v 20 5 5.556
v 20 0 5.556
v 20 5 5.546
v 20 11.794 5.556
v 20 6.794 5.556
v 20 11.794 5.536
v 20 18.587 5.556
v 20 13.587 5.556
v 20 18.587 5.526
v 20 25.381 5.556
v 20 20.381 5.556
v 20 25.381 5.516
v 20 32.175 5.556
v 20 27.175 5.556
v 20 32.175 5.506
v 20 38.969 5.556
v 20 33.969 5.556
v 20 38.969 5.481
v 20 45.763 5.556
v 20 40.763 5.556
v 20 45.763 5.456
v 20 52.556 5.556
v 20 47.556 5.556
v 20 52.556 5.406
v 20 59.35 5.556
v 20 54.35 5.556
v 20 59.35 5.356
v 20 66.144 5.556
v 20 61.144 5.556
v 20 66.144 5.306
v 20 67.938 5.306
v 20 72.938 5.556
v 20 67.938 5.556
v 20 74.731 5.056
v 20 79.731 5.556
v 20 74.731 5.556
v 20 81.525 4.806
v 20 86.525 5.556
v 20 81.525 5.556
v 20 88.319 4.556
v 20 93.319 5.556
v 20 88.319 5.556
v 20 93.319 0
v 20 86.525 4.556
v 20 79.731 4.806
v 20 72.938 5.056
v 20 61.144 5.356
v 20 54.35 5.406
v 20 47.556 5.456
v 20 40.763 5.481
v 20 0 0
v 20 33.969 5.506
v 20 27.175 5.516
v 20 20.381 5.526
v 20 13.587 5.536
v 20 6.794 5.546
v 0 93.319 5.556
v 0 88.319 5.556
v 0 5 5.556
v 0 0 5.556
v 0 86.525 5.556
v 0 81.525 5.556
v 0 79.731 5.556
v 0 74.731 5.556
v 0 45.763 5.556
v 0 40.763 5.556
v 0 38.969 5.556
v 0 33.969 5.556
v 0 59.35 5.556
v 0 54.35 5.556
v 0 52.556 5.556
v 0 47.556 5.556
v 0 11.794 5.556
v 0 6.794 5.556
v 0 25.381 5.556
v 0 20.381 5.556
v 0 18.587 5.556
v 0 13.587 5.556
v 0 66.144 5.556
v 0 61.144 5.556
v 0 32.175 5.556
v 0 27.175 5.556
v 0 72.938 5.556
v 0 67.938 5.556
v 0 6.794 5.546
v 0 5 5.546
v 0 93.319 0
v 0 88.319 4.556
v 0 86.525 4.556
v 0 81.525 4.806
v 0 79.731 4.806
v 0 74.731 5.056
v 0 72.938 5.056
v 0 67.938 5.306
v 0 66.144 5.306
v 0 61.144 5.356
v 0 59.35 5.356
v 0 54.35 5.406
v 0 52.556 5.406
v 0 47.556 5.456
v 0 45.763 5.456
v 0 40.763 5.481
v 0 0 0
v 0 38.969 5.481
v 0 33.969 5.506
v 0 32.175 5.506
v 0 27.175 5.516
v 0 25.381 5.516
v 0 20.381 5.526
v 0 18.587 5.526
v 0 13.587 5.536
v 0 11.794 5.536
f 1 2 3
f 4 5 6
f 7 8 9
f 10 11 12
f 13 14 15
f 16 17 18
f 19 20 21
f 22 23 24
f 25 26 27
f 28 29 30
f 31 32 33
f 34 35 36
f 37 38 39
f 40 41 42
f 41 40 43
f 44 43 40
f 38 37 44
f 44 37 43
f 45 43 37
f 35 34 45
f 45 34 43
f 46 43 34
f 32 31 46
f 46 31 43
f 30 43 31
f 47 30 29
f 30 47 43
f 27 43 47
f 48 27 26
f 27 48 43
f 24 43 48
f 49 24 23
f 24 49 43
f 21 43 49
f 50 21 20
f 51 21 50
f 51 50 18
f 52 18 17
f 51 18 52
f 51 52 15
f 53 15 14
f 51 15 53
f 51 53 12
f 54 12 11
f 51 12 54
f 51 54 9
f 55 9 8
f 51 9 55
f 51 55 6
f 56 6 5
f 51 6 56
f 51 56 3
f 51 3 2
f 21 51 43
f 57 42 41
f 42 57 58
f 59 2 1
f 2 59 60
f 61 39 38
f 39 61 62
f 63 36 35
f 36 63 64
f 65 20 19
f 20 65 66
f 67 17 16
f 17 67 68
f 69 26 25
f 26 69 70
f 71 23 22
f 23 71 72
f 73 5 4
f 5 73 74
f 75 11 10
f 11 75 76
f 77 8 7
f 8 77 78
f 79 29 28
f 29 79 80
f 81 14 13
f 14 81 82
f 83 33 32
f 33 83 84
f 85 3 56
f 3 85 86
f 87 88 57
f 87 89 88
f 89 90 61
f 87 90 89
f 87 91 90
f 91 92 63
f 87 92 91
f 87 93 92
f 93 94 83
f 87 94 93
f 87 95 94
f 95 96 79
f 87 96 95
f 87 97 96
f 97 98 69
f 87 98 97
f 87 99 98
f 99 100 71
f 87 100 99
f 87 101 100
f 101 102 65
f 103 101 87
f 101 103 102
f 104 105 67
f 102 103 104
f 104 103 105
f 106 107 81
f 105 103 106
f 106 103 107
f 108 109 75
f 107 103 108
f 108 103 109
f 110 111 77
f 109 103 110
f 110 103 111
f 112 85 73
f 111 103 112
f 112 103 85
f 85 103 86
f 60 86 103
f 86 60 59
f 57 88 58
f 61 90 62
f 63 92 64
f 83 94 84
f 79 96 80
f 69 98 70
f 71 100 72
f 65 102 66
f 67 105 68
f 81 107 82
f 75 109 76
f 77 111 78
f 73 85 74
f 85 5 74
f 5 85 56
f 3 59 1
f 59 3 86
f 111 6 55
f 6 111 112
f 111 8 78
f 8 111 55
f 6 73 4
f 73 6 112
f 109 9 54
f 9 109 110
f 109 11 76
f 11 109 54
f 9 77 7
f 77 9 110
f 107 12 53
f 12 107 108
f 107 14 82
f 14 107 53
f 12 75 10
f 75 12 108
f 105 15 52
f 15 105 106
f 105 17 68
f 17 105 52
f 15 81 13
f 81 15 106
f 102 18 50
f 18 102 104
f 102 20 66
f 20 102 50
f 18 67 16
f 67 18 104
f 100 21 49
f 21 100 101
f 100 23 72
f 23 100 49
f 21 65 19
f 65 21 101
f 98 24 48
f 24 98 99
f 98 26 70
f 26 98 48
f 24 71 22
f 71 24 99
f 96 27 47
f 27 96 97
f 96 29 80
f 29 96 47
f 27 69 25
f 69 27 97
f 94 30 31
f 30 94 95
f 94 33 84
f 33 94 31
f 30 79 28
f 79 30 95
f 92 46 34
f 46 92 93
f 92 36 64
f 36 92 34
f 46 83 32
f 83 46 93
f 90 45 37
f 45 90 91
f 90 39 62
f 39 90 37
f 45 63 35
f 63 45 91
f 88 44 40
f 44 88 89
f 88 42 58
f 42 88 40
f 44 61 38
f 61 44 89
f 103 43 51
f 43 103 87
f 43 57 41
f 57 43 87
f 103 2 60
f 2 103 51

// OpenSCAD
//Parameters
  //Cube sizes to test
  zDepth = [0.01, 0.02, 0.03, 0.04, 0.05, 0.075, 0.1, 0.15, 0.2, 0.25, 0.5, 0.75, 1];  
  //End mill diameter 
  endMillD = 0.79375;  //1/32"
  //Stock and test piece definitions
  stockZ = 5.556;
  stockX = 20;
  //Spacing between depth tests
  spacing = 5; 

//Maths
  //Add 1mm to end mill diameter to space out replicates
  CutWidth = endMillD + 1;
  StockY = (((CutWidth)+spacing)*len(zDepth))+spacing;
  echo(StockY=StockY);
  
//uncomment to render
ZTestDevice();

//Module Definition
module ZTestDevice(){
  difference(){
    cube([stockX,StockY,stockZ], center=false);
    for(i = [0 : len(zDepth)-1]){
      let(YLocation = i*(CutWidth+spacing)){
	translate([0,YLocation+spacing,stockZ-zDepth[i]])cube([stockX,CutWidth,zDepth[i]], center=false);	
      }
    }
  }
}
